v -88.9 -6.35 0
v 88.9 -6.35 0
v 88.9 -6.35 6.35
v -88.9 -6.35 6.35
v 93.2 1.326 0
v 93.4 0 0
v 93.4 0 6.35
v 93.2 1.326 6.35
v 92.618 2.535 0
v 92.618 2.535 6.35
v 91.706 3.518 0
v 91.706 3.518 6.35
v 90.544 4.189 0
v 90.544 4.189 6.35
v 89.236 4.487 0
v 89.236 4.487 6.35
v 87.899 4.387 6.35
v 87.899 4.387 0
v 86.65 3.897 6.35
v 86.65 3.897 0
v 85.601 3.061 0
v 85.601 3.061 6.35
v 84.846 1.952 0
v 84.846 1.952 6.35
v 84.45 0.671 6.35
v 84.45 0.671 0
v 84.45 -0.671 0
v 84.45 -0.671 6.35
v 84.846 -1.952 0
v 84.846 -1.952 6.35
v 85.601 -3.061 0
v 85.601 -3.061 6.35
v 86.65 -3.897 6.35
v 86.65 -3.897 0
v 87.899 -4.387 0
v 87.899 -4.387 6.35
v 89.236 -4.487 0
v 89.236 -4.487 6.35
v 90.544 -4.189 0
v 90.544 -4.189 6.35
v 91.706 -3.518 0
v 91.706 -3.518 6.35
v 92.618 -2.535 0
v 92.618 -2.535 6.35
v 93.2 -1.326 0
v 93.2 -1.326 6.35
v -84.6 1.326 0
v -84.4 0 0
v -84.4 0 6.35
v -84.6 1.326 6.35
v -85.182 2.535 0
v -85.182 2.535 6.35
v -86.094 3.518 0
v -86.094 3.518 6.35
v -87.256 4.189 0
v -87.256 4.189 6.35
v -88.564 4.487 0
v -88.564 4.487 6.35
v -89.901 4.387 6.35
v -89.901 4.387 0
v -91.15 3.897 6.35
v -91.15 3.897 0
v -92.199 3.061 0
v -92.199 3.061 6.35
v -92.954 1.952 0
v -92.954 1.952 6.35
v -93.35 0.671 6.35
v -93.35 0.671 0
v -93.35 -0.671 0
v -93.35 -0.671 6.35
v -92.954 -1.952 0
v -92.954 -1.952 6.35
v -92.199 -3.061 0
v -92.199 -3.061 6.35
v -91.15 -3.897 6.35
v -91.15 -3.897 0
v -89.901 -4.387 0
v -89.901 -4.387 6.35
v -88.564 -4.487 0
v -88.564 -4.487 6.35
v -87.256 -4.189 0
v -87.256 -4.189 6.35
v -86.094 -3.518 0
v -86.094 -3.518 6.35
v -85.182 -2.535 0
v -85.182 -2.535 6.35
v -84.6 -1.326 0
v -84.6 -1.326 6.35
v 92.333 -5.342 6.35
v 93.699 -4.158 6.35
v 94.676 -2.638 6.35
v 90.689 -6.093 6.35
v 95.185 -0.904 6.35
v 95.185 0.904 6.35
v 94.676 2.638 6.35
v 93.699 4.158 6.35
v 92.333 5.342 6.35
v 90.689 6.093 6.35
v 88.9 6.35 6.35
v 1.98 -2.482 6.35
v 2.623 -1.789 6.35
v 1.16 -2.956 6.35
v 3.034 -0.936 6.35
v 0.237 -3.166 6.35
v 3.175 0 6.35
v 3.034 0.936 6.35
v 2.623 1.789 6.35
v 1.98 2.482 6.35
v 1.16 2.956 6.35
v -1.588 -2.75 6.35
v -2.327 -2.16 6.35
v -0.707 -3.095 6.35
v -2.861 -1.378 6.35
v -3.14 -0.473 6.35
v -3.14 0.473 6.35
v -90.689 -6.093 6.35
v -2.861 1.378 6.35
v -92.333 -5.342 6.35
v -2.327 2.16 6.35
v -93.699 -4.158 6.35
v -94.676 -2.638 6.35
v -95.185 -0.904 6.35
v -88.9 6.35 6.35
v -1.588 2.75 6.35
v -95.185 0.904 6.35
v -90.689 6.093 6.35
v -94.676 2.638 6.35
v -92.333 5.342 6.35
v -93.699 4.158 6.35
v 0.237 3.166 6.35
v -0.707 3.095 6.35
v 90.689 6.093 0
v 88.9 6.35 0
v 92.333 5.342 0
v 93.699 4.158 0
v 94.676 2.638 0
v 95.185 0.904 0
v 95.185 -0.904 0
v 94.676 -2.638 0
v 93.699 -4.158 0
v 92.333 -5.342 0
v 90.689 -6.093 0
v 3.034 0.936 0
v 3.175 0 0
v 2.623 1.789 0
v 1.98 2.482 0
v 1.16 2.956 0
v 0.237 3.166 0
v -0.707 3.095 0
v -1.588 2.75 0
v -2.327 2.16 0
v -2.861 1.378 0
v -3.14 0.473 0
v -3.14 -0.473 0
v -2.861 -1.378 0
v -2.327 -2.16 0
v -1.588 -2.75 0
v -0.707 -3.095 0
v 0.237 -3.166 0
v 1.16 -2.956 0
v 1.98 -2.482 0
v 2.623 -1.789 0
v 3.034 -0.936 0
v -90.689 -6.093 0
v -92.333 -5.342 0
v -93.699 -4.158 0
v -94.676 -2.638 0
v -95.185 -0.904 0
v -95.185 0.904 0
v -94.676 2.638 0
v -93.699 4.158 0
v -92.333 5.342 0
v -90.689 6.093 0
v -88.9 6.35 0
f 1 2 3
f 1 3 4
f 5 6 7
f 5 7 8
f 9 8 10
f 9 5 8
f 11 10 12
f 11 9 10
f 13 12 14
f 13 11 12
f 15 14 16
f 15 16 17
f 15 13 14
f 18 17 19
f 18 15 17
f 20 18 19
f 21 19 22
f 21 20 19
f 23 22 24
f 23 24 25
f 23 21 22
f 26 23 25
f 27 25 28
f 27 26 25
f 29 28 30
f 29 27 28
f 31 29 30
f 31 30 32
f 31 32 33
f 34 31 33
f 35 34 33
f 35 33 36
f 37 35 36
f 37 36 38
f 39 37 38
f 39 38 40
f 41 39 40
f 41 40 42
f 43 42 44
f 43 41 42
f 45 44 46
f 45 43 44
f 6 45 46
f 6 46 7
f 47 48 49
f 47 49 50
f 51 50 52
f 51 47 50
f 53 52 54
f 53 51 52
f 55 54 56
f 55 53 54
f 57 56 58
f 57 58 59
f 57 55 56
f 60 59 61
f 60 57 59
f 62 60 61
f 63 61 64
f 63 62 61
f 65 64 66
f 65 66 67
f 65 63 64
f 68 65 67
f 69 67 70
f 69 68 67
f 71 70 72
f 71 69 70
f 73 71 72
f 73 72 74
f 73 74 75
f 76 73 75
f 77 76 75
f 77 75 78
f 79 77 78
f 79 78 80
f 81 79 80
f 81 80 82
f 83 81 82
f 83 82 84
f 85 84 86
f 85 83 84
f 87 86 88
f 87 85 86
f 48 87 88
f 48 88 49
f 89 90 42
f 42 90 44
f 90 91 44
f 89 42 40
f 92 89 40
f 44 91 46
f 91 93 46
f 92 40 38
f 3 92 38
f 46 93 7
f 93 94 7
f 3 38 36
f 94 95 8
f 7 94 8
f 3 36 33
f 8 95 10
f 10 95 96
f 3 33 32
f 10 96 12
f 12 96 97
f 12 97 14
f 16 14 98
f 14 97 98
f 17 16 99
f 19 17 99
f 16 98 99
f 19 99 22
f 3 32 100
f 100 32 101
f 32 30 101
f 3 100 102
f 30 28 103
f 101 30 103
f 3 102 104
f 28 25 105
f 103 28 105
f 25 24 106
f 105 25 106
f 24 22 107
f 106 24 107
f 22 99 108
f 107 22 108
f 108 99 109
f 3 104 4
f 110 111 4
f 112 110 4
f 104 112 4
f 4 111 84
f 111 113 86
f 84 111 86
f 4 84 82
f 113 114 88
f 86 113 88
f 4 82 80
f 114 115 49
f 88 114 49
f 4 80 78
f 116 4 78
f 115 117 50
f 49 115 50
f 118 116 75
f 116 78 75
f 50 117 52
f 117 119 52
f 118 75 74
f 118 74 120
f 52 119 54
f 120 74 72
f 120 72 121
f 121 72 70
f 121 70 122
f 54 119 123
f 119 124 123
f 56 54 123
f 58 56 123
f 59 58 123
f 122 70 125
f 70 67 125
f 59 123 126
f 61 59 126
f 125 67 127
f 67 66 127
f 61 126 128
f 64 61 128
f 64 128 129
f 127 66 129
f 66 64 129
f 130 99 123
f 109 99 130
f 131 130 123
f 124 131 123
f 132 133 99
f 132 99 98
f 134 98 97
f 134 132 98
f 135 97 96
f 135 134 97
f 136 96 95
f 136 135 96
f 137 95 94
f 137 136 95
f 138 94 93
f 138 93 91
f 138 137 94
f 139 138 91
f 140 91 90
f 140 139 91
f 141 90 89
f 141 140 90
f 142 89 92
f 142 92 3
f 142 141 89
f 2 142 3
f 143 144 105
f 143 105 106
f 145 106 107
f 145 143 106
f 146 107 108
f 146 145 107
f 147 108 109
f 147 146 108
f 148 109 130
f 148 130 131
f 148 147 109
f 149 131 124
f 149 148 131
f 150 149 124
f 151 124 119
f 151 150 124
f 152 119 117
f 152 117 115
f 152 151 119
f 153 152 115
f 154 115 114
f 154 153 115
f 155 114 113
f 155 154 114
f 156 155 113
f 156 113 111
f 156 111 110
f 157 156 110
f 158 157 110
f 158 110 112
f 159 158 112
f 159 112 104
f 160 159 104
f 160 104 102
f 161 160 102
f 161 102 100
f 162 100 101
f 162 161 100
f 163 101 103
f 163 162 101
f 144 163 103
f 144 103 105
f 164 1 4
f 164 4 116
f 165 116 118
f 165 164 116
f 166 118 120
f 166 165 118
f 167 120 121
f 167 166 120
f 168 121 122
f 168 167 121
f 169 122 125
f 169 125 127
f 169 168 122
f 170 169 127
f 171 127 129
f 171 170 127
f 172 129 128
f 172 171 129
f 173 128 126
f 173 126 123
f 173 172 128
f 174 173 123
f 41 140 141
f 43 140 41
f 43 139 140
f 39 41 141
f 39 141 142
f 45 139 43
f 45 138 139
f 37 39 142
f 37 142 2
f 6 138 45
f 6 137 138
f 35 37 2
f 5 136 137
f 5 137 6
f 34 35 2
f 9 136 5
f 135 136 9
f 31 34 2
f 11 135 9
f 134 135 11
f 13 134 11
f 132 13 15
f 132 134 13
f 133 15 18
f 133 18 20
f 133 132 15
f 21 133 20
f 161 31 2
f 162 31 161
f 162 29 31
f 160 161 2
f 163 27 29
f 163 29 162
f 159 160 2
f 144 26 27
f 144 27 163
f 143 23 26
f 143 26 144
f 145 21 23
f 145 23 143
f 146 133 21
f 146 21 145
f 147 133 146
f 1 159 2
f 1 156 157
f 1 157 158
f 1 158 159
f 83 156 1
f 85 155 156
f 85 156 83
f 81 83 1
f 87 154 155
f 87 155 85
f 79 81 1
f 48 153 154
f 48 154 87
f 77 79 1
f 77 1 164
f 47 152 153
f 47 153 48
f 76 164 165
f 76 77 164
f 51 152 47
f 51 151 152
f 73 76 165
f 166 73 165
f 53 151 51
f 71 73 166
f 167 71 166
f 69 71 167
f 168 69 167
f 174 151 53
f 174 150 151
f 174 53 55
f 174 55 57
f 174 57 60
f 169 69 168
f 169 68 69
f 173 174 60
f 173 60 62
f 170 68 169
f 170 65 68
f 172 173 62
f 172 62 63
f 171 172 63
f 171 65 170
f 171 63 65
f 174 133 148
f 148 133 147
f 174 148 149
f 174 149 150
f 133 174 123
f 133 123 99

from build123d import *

# Parameters (mm, degrees)
SKETCH1_R           = 4.5
SKETCH1_R_2         = 3.175
BOSS_EXTRUDE1_DEPTH = 6.35


with BuildPart() as part:
    # Sketch1 → Boss-Extrude1 (new body)
    with BuildSketch(Plane.XY):
        with BuildLine():
            Line((-88.9, 6.35), (88.9, 6.35))
            ThreePointArc((88.9, 6.35), (95.25, 0), (88.9, -6.35))
            Line((88.9, -6.35), (-88.9, -6.35))
            ThreePointArc((-88.9, -6.35), (-95.25, 0), (-88.9, 6.35))
        make_face()
        with Locations((-88.9, 0)):
            Circle(SKETCH1_R, mode=Mode.SUBTRACT)
        with Locations((88.9, 0)):
            Circle(SKETCH1_R, mode=Mode.SUBTRACT)
        Circle(SKETCH1_R_2, mode=Mode.SUBTRACT)
    extrude(amount=BOSS_EXTRUDE1_DEPTH)


solid = part.part
